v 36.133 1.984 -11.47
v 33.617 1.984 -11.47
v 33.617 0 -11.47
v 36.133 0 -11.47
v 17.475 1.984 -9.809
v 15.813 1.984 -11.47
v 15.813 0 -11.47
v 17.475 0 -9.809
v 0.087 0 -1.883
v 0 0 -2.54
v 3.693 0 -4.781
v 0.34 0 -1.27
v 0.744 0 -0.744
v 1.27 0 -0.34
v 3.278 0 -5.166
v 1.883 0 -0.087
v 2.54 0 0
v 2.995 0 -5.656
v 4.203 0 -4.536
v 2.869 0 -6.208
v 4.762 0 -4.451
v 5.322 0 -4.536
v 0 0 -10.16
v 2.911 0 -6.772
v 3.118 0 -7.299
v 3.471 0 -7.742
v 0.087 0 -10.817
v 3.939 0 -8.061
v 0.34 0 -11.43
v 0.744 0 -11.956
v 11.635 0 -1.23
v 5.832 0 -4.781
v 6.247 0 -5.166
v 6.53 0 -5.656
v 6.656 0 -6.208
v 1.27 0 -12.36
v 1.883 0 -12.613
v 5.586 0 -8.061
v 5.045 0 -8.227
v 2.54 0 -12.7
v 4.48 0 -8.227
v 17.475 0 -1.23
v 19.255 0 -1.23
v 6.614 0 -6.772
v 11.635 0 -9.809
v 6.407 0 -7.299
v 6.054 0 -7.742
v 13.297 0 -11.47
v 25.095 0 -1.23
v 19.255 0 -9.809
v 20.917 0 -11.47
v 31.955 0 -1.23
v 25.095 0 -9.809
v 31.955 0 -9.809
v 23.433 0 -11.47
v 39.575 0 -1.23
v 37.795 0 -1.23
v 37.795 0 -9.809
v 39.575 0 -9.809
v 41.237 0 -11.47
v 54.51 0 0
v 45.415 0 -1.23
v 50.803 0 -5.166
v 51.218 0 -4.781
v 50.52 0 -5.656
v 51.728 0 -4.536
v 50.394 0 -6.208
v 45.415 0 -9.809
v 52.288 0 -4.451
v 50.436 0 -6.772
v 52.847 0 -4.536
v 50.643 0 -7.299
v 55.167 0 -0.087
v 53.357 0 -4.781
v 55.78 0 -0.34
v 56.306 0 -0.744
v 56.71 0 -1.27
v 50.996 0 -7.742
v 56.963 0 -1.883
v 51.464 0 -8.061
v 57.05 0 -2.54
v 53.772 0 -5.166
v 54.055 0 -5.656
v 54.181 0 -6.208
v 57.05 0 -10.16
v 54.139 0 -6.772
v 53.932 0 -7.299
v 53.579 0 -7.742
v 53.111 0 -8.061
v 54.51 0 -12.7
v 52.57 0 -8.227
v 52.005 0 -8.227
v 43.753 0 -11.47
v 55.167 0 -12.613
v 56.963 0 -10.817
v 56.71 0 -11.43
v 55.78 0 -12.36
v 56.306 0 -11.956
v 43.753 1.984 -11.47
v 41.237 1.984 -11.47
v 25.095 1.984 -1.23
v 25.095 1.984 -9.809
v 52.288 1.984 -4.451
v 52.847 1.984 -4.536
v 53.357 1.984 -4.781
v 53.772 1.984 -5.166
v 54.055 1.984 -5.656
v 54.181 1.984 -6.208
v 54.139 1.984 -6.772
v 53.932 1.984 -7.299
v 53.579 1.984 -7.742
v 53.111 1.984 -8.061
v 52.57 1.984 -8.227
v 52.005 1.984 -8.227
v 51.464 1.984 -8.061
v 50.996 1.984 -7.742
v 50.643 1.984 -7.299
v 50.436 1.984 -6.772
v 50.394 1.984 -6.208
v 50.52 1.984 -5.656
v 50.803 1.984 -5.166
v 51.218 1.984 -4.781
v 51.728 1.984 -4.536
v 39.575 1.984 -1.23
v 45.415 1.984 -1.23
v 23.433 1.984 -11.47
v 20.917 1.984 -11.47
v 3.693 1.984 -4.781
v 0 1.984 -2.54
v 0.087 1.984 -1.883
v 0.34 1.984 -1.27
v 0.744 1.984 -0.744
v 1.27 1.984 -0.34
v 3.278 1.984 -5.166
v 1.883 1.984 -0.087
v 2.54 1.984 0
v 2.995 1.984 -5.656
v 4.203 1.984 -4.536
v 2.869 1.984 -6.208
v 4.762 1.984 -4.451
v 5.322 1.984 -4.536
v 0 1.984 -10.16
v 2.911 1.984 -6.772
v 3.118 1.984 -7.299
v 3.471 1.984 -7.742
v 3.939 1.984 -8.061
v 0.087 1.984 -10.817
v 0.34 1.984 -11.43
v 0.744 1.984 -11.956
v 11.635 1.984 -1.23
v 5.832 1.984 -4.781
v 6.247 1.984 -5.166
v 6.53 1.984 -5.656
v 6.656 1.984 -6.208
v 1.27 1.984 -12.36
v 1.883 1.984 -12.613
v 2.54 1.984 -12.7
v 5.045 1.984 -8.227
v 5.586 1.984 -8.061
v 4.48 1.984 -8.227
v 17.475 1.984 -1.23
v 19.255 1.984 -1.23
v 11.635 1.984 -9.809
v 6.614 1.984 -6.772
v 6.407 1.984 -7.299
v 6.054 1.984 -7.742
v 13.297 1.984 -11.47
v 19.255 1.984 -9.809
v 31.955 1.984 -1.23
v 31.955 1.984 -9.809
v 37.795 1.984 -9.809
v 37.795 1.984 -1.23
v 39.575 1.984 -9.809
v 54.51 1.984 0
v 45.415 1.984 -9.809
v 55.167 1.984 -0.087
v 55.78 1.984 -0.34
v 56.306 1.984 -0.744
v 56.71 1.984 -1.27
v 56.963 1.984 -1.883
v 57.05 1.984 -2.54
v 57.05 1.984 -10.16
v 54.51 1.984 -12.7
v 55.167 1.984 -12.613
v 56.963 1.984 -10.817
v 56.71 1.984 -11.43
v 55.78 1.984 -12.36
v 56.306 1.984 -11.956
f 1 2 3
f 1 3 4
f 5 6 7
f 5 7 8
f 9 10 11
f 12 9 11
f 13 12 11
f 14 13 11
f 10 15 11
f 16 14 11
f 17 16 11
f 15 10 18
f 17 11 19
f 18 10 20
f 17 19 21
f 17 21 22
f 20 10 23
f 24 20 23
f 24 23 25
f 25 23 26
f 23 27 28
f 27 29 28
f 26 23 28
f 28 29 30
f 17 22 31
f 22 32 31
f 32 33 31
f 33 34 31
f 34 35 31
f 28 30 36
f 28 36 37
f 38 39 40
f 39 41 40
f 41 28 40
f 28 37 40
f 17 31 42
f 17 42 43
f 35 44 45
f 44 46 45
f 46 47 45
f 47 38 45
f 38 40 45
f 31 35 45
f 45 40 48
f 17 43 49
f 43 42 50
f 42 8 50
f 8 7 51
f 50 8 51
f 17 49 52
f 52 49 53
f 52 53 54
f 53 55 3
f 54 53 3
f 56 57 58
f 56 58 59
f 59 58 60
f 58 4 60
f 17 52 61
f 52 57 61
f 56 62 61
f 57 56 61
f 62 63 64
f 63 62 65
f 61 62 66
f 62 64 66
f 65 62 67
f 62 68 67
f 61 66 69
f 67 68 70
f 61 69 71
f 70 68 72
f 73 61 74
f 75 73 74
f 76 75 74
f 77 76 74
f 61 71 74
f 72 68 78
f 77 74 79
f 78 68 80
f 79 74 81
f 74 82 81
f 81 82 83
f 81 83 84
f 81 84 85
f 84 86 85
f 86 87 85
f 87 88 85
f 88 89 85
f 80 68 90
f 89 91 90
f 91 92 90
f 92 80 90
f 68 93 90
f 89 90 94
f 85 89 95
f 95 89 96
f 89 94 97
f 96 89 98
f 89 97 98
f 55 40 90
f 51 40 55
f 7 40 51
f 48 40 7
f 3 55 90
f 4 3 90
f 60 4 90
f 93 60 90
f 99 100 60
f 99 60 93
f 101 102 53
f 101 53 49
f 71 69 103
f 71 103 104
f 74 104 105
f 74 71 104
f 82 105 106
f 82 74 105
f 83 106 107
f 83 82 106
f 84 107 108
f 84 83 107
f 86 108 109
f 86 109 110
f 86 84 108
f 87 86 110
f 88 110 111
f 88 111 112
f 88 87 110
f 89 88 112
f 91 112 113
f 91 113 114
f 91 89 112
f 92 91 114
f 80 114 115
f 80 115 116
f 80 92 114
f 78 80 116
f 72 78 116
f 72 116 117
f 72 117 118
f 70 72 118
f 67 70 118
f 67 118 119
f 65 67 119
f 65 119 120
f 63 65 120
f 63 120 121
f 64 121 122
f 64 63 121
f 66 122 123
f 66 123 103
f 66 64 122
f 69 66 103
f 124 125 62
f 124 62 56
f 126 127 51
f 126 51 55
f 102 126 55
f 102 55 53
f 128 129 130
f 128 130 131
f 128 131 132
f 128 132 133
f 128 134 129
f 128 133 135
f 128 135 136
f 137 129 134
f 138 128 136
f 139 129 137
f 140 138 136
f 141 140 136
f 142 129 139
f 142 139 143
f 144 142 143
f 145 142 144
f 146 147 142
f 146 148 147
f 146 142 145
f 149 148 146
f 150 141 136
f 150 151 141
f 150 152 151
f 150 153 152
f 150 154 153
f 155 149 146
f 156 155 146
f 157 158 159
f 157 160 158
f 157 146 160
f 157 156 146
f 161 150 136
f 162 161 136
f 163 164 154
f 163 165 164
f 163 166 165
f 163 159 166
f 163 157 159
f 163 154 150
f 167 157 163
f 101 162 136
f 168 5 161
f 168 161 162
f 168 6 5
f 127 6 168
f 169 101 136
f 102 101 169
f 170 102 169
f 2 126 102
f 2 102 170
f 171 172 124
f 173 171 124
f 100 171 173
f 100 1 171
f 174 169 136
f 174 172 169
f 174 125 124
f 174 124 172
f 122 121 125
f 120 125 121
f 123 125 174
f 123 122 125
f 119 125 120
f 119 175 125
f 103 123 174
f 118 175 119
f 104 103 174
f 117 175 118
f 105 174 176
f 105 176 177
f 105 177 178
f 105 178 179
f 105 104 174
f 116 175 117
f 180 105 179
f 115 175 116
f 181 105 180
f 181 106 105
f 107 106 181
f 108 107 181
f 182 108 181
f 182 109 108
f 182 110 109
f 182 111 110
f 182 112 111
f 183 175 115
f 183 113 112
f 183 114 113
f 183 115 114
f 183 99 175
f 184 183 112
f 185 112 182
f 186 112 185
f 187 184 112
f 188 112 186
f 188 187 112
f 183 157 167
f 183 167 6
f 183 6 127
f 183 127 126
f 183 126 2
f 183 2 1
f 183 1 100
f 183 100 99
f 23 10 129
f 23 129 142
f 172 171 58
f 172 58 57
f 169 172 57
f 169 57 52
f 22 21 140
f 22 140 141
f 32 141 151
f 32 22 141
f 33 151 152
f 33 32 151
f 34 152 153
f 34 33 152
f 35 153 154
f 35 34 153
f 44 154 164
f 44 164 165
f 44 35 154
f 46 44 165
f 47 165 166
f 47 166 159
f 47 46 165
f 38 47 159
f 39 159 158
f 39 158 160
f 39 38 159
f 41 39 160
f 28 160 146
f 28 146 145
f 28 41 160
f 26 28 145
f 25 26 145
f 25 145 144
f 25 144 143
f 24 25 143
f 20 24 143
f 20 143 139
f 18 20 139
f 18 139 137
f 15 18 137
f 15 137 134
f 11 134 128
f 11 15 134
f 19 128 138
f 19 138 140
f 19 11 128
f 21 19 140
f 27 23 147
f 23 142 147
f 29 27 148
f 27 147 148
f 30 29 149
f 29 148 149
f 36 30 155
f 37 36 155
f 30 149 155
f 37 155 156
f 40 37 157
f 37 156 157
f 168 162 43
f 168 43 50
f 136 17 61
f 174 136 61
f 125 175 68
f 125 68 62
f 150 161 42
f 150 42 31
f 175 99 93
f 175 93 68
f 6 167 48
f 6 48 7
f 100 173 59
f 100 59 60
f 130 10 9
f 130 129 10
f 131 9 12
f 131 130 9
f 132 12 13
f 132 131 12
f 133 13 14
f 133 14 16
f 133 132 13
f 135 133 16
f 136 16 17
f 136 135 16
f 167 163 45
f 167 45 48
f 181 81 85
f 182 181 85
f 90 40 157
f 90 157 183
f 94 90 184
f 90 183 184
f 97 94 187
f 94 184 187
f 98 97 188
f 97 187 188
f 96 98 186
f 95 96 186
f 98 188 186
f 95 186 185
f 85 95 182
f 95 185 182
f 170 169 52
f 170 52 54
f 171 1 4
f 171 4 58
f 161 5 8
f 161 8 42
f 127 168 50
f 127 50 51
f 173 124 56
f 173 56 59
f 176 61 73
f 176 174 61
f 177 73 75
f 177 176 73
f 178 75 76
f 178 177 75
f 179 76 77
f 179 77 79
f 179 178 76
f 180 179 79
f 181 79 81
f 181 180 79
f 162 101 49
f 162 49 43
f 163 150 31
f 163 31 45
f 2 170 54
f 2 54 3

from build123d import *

# Parameters (mm, degrees)
SKETCH1_W           = 57.05
SKETCH1_H           = 12.7
SKETCH1_R           = 1.89865
BOSS_EXTRUDE1_DEPTH = 1.984375
CUT_EXTRUDE1_REACH  = 60.48
FILLET1_R           = 2.54


with BuildPart() as part:
    # Sketch1 → Boss-Extrude1 (new body)
    with BuildSketch(Plane(origin=(0, 0, 0), x_dir=(1, 0, 0), z_dir=(0, 1, 0))):
        with Locations((28.525, 6.35)):
            Rectangle(SKETCH1_W, SKETCH1_H)
        with Locations(Location((52.2875, 6.35, 0), (0, 0, 270))):
            Circle(SKETCH1_R, mode=Mode.SUBTRACT)
        with Locations(Location((4.7625, 6.35, 0), (0, 0, 270))):
            Circle(SKETCH1_R, mode=Mode.SUBTRACT)
    extrude(amount=BOSS_EXTRUDE1_DEPTH)

    # Sketch2 → Cut-Extrude1 (cut, up to next)
    with BuildSketch(Plane(origin=(0, 1.984375, 0), x_dir=(1, 0, 0), z_dir=(0, 1, 0)), mode=Mode.PRIVATE) as cut_extrude1_sk1:
        Polygon((17.475, 1.23), (11.635, 1.23), (11.635, 9.808717093), (13.29671726, 11.47), (15.81328274, 11.47), (17.475, 9.808717093), align=None)
    cut_extrude1_tool1 = extrude(cut_extrude1_sk1.sketch, amount=-CUT_EXTRUDE1_REACH, mode=Mode.PRIVATE) & part.part
    # Sketch2 → Cut-Extrude1 (cut, up to next)
    with BuildSketch(Plane(origin=(0, 1.984375, 0), x_dir=(1, 0, 0), z_dir=(0, 1, 0)), mode=Mode.PRIVATE) as cut_extrude1_sk2:
        Polygon((45.415, 1.23), (39.575, 1.23), (39.575, 9.808717093), (41.23671726, 11.47), (43.75328274, 11.47), (45.415, 9.808717093), align=None)
    cut_extrude1_tool2 = extrude(cut_extrude1_sk2.sketch, amount=-CUT_EXTRUDE1_REACH, mode=Mode.PRIVATE) & part.part
    # Sketch2 → Cut-Extrude1 (cut, up to next)
    with BuildSketch(Plane(origin=(0, 1.984375, 0), x_dir=(1, 0, 0), z_dir=(0, 1, 0)), mode=Mode.PRIVATE) as cut_extrude1_sk3:
        Polygon((25.095, 1.23), (19.255, 1.23), (19.255, 9.808717093), (20.91671726, 11.47), (23.43328274, 11.47), (25.095, 9.808717093), align=None)
    cut_extrude1_tool3 = extrude(cut_extrude1_sk3.sketch, amount=-CUT_EXTRUDE1_REACH, mode=Mode.PRIVATE) & part.part
    # Sketch2 → Cut-Extrude1 (cut, up to next)
    with BuildSketch(Plane(origin=(0, 1.984375, 0), x_dir=(1, 0, 0), z_dir=(0, 1, 0)), mode=Mode.PRIVATE) as cut_extrude1_sk4:
        Polygon((37.795, 1.23), (31.955, 1.23), (31.955, 9.808717093), (33.61671726, 11.47), (36.13328274, 11.47), (37.795, 9.808717093), align=None)
    cut_extrude1_tool4 = extrude(cut_extrude1_sk4.sketch, amount=-CUT_EXTRUDE1_REACH, mode=Mode.PRIVATE) & part.part
    add(cut_extrude1_tool1.solids().sort_by_distance((14.555, 1.984375, -6.12901))[0], mode=Mode.SUBTRACT)
    add(cut_extrude1_tool2.solids().sort_by_distance((42.495, 1.984375, -6.12901))[0], mode=Mode.SUBTRACT)
    add(cut_extrude1_tool3.solids().sort_by_distance((22.175, 1.984375, -6.12901))[0], mode=Mode.SUBTRACT)
    add(cut_extrude1_tool4.solids().sort_by_distance((34.875, 1.984375, -6.12901))[0], mode=Mode.SUBTRACT)

    # Fillet1
    fillet1_edges = [part.edges().sort_by_distance(p)[0] for p in [
        (0, 0.9921875, -12.7),
        (57.05, 0.9921875, -12.7),
        (57.05, 0.9921875, 0),
        (0, 0.9921875, 0),
    ]]
    fillet(fillet1_edges, radius=FILLET1_R)


solid = part.part
